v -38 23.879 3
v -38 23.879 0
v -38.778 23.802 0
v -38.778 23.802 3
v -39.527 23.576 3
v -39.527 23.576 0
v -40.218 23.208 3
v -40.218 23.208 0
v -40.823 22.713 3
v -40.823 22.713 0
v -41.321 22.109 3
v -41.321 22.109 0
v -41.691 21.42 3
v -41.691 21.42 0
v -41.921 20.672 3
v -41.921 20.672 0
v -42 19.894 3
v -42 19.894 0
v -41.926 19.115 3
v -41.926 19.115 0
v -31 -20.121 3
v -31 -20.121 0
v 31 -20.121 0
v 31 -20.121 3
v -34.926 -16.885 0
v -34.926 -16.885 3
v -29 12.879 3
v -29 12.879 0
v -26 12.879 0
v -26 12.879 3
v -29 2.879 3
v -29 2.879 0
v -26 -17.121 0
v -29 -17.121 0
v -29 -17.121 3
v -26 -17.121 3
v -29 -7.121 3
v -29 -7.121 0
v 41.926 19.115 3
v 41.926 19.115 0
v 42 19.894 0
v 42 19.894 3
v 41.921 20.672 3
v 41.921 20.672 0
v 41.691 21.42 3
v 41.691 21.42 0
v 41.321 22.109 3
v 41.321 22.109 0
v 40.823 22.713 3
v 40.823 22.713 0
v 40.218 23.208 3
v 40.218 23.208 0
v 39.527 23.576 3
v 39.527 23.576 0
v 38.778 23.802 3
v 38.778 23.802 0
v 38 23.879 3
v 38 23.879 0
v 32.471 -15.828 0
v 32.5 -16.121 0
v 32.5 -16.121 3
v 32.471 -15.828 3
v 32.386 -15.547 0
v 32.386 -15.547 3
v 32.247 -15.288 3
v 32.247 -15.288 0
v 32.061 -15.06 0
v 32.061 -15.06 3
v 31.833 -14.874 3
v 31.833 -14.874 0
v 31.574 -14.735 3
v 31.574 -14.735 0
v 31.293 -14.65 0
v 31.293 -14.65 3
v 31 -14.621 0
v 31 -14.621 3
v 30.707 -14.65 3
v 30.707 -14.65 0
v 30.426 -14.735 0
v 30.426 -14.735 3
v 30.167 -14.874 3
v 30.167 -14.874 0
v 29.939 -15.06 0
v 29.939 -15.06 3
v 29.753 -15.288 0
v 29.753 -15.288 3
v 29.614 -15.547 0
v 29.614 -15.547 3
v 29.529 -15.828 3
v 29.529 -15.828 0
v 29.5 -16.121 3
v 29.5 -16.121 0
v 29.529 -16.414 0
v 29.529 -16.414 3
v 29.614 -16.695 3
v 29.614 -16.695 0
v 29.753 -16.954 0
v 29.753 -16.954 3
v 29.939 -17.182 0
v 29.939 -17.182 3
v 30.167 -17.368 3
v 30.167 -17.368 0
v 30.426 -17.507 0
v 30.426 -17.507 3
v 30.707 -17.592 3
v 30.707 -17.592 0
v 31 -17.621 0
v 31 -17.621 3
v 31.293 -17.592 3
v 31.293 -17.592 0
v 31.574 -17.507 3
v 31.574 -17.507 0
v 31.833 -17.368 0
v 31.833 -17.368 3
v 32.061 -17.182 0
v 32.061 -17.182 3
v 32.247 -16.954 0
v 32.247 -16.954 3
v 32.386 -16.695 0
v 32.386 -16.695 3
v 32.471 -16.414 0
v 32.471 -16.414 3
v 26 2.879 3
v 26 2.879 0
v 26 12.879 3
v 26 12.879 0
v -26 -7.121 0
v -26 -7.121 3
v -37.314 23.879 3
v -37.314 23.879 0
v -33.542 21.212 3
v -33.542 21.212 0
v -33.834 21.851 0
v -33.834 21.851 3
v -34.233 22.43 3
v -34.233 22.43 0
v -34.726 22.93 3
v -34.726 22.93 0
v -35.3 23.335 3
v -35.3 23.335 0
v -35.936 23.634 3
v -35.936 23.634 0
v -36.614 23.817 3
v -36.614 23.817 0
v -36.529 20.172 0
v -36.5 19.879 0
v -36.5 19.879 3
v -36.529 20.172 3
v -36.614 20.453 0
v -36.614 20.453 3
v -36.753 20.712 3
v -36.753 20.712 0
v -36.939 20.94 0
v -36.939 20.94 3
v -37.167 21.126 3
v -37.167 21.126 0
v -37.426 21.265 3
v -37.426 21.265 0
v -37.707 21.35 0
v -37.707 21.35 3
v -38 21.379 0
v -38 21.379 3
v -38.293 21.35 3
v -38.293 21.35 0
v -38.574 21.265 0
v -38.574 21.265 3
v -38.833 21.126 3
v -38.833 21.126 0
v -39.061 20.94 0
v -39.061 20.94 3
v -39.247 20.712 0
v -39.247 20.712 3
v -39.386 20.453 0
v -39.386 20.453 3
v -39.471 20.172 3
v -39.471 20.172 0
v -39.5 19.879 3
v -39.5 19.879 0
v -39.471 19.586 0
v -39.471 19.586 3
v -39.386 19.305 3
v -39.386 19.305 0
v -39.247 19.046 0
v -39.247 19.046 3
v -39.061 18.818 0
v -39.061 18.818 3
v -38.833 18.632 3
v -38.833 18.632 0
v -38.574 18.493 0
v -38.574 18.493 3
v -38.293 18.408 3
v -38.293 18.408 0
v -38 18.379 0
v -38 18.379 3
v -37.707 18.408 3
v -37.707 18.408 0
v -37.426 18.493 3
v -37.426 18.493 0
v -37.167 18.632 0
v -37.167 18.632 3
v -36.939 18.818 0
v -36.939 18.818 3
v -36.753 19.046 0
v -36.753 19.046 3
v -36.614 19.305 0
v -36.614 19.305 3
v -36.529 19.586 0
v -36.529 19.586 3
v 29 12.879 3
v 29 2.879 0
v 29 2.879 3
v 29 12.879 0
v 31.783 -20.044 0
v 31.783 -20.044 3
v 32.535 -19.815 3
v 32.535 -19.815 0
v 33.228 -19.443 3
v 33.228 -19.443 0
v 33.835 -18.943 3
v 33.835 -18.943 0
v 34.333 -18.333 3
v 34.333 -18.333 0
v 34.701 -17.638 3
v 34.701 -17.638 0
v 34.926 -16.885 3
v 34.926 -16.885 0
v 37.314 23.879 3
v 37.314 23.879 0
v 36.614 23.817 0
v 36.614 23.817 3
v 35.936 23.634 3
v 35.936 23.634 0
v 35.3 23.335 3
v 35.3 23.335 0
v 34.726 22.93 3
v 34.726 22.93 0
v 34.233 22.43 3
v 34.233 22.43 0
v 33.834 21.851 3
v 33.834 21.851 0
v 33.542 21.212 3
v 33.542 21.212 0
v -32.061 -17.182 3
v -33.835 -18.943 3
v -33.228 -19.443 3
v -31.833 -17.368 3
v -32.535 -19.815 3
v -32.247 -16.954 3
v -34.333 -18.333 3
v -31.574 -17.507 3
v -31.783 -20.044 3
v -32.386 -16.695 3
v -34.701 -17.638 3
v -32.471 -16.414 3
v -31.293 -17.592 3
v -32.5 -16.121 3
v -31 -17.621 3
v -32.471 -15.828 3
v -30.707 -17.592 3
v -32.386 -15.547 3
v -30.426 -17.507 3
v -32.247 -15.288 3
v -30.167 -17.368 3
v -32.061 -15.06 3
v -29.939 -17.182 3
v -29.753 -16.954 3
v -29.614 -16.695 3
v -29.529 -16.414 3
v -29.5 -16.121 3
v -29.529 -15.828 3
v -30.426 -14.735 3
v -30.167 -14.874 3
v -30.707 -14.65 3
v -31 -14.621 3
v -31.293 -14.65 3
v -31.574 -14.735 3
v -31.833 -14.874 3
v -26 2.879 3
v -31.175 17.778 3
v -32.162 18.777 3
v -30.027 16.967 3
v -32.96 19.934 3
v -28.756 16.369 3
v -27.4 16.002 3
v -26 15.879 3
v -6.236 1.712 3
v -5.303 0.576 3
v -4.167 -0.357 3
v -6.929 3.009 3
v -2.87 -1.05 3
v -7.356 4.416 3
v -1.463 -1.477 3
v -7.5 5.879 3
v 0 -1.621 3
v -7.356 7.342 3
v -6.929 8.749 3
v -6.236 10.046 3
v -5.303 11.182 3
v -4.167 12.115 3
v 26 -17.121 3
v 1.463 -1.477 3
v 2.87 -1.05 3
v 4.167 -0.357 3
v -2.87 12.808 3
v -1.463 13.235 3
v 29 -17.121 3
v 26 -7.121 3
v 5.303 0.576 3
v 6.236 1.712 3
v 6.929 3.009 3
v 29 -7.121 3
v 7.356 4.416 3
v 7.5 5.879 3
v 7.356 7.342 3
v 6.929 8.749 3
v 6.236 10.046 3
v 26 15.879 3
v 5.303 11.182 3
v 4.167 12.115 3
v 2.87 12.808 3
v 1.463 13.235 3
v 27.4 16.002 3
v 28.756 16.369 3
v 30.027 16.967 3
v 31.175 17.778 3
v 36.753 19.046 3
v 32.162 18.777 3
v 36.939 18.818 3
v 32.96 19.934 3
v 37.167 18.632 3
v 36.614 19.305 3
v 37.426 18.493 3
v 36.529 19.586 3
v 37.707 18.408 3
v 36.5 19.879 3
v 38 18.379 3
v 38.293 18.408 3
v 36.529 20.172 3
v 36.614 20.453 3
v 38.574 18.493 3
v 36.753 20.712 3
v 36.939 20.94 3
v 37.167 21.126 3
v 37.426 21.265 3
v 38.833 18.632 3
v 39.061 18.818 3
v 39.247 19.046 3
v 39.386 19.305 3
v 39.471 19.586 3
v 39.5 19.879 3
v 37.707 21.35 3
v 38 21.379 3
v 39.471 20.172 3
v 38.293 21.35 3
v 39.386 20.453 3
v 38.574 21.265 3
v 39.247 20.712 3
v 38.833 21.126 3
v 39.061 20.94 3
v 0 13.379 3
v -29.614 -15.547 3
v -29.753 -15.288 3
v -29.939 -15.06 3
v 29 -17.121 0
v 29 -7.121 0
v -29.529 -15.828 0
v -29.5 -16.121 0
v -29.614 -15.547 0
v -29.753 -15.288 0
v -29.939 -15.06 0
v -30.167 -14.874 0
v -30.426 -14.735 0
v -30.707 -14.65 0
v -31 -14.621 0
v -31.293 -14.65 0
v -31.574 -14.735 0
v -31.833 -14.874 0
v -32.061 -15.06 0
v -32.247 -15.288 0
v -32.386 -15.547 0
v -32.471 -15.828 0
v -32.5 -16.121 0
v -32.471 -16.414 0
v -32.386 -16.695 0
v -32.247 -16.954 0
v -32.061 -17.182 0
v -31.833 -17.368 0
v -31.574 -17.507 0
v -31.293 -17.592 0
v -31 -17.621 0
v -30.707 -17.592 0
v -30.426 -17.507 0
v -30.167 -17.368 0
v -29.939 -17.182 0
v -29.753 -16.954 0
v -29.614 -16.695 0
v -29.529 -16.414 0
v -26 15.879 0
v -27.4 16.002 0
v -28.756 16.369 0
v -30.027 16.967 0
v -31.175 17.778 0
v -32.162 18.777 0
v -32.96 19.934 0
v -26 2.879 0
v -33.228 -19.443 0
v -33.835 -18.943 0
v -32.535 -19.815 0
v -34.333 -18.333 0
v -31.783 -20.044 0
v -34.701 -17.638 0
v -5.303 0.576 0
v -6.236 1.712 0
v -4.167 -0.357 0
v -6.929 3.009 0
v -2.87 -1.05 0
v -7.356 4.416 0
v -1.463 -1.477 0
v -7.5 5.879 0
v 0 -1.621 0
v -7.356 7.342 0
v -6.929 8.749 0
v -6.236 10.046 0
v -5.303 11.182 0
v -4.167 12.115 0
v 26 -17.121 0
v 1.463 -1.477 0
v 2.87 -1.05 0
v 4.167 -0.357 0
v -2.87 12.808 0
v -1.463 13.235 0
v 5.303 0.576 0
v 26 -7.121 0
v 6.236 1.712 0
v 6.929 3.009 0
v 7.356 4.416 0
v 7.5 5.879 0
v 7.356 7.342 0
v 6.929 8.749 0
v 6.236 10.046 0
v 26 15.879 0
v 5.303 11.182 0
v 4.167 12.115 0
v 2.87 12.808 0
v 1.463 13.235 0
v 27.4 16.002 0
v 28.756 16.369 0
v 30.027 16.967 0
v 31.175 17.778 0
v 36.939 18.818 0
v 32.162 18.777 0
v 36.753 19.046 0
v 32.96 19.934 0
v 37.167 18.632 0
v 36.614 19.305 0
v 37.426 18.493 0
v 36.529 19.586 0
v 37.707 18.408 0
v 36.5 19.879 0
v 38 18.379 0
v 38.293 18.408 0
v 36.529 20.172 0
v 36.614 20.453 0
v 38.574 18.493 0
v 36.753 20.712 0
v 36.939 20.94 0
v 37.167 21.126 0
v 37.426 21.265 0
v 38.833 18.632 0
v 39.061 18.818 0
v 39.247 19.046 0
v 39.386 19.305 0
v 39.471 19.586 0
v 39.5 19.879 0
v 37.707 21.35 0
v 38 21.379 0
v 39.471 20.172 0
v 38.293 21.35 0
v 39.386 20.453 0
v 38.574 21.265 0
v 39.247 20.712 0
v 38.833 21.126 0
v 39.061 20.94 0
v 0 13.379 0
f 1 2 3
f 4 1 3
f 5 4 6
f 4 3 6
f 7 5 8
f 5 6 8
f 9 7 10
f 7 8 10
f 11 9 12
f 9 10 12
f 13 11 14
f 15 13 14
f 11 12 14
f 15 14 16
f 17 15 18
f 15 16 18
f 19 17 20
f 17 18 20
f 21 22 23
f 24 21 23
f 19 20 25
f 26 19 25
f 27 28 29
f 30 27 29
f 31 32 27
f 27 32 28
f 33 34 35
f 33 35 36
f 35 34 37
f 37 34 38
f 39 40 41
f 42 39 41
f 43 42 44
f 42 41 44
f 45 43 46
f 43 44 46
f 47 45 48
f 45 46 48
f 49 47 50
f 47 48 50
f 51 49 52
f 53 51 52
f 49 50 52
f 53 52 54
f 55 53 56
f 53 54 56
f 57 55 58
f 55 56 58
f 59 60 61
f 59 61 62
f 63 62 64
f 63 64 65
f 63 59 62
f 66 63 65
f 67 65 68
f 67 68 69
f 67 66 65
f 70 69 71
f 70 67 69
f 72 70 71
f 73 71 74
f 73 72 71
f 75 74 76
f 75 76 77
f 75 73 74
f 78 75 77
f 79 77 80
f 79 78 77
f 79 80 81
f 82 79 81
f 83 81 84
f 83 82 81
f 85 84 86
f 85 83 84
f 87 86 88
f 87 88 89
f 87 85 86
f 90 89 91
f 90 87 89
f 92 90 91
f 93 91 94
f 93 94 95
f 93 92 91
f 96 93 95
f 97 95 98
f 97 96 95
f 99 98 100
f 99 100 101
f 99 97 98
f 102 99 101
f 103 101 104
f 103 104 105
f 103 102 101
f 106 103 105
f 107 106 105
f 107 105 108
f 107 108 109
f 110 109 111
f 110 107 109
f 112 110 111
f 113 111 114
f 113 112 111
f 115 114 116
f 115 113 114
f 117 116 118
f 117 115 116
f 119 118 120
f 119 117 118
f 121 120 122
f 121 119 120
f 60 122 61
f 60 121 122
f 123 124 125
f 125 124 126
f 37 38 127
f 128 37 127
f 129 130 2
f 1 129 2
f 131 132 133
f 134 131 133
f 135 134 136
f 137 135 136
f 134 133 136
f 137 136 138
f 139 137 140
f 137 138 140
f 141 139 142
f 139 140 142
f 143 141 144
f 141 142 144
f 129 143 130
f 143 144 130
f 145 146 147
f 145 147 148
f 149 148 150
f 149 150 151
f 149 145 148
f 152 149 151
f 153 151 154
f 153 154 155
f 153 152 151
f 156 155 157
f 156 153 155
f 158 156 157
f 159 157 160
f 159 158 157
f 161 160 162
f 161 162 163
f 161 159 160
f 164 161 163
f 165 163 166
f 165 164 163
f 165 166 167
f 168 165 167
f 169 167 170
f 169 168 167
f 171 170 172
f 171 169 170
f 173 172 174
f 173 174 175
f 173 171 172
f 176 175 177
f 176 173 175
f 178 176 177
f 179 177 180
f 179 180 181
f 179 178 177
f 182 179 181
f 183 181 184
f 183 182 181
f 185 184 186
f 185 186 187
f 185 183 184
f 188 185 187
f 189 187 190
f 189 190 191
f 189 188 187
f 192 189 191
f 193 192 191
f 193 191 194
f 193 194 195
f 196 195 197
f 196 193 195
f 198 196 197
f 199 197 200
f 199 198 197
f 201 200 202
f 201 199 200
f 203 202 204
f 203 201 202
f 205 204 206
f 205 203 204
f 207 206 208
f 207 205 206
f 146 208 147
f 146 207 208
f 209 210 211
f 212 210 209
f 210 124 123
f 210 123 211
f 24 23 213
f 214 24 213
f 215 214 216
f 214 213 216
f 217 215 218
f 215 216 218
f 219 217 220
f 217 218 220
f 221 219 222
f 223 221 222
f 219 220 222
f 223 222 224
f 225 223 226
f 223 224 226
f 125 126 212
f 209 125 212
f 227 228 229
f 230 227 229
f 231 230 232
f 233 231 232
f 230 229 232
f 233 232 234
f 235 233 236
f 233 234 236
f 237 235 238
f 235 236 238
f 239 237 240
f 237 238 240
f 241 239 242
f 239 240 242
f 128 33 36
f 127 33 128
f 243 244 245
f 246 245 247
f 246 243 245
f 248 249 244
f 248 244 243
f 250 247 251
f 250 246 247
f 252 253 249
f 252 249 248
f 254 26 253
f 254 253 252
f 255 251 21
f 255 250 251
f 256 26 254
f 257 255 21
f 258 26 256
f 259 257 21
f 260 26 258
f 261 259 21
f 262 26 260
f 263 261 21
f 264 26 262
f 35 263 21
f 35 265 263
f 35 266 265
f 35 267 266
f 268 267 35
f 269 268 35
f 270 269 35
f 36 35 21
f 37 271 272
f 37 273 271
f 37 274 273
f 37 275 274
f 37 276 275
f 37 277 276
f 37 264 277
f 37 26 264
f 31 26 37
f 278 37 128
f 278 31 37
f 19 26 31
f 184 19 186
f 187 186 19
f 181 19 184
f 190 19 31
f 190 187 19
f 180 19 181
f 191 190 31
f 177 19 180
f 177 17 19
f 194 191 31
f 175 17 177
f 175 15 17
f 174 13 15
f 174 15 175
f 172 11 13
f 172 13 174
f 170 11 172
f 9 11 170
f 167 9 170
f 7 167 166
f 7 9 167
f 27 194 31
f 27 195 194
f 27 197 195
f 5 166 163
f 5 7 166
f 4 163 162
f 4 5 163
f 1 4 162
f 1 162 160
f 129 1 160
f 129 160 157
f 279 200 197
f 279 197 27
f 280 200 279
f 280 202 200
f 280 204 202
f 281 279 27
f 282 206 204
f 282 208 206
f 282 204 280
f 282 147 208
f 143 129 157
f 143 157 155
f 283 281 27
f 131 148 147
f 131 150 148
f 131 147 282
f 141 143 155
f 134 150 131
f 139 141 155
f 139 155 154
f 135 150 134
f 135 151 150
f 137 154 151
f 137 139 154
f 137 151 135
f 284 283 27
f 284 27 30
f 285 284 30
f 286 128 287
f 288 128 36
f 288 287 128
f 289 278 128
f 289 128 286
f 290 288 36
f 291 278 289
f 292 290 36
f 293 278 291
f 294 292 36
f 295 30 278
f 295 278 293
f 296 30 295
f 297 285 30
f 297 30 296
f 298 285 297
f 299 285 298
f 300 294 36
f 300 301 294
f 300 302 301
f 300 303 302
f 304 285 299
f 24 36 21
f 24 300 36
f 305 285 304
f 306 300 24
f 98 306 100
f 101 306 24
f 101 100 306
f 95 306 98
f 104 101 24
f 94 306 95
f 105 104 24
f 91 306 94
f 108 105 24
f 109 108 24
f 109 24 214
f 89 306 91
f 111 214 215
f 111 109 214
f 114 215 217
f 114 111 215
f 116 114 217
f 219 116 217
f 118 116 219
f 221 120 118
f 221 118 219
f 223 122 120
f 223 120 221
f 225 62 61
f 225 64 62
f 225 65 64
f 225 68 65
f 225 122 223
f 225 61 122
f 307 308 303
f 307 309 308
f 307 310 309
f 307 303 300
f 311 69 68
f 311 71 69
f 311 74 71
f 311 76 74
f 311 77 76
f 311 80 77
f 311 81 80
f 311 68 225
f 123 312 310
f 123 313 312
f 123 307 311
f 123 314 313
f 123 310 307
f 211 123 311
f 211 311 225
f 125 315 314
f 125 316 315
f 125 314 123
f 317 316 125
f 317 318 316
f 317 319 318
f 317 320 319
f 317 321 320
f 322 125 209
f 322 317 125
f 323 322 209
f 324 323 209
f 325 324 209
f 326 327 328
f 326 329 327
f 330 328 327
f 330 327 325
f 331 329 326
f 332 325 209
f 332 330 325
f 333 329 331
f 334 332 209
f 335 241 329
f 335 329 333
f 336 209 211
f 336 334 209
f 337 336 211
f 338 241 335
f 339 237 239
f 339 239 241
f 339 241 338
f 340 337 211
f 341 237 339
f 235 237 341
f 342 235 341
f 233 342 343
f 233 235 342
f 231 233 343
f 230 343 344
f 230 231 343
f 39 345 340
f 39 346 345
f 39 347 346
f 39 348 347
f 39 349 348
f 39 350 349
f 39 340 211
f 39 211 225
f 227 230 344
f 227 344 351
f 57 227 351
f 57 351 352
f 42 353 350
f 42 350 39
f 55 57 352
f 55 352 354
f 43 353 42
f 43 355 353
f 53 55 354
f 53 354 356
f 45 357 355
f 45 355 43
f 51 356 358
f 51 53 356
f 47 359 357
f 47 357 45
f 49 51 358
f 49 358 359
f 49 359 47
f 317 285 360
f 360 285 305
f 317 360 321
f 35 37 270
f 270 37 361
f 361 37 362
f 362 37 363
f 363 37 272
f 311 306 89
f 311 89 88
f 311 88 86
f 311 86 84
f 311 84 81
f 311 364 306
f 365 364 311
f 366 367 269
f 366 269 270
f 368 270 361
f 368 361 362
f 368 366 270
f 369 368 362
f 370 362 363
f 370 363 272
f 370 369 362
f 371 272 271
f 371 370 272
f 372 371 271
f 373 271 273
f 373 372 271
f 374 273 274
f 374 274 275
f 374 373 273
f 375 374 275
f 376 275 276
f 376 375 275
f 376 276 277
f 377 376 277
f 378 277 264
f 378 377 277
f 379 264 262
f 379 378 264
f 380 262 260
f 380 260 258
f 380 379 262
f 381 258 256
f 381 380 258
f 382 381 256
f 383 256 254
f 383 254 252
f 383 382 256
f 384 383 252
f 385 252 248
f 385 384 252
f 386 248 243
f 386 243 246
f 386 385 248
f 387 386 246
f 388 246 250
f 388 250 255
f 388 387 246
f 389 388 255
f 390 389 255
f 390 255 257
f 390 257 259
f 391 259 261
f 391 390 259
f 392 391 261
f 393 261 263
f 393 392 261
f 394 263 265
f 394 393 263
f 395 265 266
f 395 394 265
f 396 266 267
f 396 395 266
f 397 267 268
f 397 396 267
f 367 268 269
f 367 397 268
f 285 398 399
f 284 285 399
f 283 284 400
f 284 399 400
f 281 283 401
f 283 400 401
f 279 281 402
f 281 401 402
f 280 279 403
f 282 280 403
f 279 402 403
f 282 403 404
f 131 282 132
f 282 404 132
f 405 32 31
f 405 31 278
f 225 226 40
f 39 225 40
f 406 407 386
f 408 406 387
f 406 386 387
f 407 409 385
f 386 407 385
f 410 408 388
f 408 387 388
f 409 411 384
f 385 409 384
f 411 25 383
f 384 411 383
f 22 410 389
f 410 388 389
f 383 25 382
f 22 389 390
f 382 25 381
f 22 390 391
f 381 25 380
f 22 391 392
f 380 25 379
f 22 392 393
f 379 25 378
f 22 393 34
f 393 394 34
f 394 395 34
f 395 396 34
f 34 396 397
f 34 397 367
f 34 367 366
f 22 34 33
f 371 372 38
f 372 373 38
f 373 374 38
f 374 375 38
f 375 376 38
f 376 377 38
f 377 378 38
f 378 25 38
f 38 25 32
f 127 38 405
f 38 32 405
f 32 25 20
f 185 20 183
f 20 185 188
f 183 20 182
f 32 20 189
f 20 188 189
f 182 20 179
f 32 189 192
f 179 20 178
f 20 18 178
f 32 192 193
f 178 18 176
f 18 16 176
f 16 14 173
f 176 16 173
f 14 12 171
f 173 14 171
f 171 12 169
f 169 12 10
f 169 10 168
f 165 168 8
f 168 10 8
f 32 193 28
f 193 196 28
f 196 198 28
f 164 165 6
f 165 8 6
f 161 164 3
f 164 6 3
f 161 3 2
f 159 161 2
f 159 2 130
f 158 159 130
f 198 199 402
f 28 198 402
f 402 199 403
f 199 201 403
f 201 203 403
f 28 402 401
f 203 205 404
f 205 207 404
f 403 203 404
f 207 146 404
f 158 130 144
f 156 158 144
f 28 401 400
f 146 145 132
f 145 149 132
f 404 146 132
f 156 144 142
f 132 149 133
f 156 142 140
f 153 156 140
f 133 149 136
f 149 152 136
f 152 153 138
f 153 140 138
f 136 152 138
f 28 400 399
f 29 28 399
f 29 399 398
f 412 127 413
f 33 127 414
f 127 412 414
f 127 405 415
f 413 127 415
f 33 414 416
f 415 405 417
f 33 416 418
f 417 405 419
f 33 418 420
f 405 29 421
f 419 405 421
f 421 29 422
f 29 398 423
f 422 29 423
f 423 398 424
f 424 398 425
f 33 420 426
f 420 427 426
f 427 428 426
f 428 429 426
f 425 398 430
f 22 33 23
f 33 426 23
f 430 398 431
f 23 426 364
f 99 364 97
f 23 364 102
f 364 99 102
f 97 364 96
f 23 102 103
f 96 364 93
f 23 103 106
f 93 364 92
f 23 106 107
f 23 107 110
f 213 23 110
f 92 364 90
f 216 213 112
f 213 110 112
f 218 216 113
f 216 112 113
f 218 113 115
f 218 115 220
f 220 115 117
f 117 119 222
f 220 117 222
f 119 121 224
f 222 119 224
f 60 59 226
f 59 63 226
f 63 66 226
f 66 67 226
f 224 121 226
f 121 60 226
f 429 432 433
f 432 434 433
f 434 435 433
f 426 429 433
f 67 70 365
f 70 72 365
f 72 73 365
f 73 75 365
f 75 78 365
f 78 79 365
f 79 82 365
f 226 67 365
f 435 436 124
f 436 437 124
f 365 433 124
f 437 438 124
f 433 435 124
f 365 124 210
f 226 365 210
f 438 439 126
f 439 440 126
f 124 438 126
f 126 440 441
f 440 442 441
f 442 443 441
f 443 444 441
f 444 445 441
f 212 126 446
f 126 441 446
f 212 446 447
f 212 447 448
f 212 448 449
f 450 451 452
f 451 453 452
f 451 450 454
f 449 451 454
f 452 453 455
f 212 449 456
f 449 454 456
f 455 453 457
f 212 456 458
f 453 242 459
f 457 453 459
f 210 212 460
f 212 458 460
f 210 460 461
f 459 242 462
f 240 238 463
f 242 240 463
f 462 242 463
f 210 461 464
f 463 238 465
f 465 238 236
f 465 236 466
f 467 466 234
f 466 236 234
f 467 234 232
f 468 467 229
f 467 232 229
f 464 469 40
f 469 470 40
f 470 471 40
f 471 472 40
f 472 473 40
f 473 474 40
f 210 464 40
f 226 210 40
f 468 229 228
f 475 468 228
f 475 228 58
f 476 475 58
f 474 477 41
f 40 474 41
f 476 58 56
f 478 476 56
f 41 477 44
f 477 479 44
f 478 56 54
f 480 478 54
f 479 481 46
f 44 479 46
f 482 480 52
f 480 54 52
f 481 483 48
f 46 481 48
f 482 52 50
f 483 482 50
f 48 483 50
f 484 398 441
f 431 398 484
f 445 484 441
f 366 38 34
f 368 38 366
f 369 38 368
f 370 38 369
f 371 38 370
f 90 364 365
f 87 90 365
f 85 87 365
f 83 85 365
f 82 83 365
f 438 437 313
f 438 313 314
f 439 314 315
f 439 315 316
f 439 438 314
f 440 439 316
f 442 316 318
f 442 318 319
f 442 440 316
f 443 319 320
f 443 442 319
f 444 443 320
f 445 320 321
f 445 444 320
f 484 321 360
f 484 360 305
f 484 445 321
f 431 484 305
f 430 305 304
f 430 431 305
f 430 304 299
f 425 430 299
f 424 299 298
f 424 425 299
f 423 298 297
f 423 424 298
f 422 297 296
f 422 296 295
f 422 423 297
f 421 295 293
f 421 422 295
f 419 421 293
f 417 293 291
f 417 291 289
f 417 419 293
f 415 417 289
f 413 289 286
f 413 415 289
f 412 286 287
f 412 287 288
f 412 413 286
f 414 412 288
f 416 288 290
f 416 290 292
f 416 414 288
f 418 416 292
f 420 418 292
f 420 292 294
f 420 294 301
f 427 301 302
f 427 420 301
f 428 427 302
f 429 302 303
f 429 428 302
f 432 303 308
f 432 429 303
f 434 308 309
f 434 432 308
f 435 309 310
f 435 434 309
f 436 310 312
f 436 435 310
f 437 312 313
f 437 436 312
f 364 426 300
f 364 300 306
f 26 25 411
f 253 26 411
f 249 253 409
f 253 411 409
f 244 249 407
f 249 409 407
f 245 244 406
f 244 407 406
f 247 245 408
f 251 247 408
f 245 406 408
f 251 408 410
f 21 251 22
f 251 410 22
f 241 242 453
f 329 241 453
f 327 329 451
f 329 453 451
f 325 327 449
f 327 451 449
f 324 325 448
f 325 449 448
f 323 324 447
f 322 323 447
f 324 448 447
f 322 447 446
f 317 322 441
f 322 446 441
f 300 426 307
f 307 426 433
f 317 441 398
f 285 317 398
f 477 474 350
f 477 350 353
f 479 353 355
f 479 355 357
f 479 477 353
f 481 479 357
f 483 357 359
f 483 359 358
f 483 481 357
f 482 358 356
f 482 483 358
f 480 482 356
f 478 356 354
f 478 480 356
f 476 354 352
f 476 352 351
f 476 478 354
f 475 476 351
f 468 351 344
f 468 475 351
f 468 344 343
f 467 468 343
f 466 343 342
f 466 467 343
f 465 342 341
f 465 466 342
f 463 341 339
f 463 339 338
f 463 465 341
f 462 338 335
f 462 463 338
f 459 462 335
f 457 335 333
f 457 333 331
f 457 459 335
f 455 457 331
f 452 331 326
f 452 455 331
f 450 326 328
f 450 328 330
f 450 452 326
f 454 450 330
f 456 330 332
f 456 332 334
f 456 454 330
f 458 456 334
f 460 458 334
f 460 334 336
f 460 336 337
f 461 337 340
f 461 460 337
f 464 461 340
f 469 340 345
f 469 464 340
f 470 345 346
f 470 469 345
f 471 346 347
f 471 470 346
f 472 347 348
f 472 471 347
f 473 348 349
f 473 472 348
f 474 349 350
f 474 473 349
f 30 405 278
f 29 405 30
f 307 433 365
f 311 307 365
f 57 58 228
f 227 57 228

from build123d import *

# Parameters (mm, degrees)
SKETCH1_R           = 1.5
SKETCH1_R_2         = 7.5
SKETCH1_W           = 3
SKETCH1_H           = 10
BOSS_EXTRUDE1_DEPTH = 3


with BuildPart() as part:
    # Sketch1 → Boss-Extrude1 (new body)
    with BuildSketch(Plane.XY):
        with BuildLine():
            Line((-41.926461559, 19.115471746), (-34.926461559, -16.884528254))
            ThreePointArc((-34.926461559, -16.884528254), (-33.544217508, -19.207626568), (-31, -20.121049617))
            Line((-31, -20.121049617), (31, -20.121049617))
            ThreePointArc((31, -20.121049617), (33.544217508, -19.207626568), (34.926461559, -16.884528254))
            Line((34.926461559, -16.884528254), (41.926461559, 19.115471746))
            ThreePointArc((41.926461559, 19.115471746), (41.086576951, 22.42316789), (38, 23.878950383))
            Line((38, 23.878950383), (37.313708499, 23.878950383))
            ThreePointArc((37.313708499, 23.878950383), (35.004307422, 23.144936706), (33.542472333, 21.212283716))
            ThreePointArc((33.542472333, 21.212283716), (30.618802154, 17.346977735), (26, 15.878950383))
            Line((26, 15.878950383), (-26, 15.878950383))
            ThreePointArc((-26, 15.878950383), (-30.618802154, 17.346977735), (-33.542472333, 21.212283716))
            ThreePointArc((-33.542472333, 21.212283716), (-35.004307422, 23.144936706), (-37.313708499, 23.878950383))
            Line((-37.313708499, 23.878950383), (-38, 23.878950383))
            ThreePointArc((-38, 23.878950383), (-41.086576951, 22.42316789), (-41.926461559, 19.115471746))
        make_face()
        with Locations((38, 19.878950383)):
            Circle(SKETCH1_R, mode=Mode.SUBTRACT)
        with Locations((-38, 19.878950383)):
            Circle(SKETCH1_R, mode=Mode.SUBTRACT)
        with Locations((31, -16.121049617)):
            Circle(SKETCH1_R, mode=Mode.SUBTRACT)
        with Locations((-31, -16.121049617)):
            Circle(SKETCH1_R, mode=Mode.SUBTRACT)
        with Locations((0, 5.878950383)):
            Circle(SKETCH1_R_2, mode=Mode.SUBTRACT)
        with Locations((-27.5, 7.878950383)):
            Rectangle(SKETCH1_W, SKETCH1_H, mode=Mode.SUBTRACT)
        with Locations((-27.5, -12.121049617)):
            Rectangle(SKETCH1_W, SKETCH1_H, mode=Mode.SUBTRACT)
        with Locations((27.5, -12.121049617)):
            Rectangle(SKETCH1_W, SKETCH1_H, mode=Mode.SUBTRACT)
        with Locations((27.5, 7.878950383)):
            Rectangle(SKETCH1_W, SKETCH1_H, mode=Mode.SUBTRACT)
    extrude(amount=BOSS_EXTRUDE1_DEPTH)


solid = part.part
